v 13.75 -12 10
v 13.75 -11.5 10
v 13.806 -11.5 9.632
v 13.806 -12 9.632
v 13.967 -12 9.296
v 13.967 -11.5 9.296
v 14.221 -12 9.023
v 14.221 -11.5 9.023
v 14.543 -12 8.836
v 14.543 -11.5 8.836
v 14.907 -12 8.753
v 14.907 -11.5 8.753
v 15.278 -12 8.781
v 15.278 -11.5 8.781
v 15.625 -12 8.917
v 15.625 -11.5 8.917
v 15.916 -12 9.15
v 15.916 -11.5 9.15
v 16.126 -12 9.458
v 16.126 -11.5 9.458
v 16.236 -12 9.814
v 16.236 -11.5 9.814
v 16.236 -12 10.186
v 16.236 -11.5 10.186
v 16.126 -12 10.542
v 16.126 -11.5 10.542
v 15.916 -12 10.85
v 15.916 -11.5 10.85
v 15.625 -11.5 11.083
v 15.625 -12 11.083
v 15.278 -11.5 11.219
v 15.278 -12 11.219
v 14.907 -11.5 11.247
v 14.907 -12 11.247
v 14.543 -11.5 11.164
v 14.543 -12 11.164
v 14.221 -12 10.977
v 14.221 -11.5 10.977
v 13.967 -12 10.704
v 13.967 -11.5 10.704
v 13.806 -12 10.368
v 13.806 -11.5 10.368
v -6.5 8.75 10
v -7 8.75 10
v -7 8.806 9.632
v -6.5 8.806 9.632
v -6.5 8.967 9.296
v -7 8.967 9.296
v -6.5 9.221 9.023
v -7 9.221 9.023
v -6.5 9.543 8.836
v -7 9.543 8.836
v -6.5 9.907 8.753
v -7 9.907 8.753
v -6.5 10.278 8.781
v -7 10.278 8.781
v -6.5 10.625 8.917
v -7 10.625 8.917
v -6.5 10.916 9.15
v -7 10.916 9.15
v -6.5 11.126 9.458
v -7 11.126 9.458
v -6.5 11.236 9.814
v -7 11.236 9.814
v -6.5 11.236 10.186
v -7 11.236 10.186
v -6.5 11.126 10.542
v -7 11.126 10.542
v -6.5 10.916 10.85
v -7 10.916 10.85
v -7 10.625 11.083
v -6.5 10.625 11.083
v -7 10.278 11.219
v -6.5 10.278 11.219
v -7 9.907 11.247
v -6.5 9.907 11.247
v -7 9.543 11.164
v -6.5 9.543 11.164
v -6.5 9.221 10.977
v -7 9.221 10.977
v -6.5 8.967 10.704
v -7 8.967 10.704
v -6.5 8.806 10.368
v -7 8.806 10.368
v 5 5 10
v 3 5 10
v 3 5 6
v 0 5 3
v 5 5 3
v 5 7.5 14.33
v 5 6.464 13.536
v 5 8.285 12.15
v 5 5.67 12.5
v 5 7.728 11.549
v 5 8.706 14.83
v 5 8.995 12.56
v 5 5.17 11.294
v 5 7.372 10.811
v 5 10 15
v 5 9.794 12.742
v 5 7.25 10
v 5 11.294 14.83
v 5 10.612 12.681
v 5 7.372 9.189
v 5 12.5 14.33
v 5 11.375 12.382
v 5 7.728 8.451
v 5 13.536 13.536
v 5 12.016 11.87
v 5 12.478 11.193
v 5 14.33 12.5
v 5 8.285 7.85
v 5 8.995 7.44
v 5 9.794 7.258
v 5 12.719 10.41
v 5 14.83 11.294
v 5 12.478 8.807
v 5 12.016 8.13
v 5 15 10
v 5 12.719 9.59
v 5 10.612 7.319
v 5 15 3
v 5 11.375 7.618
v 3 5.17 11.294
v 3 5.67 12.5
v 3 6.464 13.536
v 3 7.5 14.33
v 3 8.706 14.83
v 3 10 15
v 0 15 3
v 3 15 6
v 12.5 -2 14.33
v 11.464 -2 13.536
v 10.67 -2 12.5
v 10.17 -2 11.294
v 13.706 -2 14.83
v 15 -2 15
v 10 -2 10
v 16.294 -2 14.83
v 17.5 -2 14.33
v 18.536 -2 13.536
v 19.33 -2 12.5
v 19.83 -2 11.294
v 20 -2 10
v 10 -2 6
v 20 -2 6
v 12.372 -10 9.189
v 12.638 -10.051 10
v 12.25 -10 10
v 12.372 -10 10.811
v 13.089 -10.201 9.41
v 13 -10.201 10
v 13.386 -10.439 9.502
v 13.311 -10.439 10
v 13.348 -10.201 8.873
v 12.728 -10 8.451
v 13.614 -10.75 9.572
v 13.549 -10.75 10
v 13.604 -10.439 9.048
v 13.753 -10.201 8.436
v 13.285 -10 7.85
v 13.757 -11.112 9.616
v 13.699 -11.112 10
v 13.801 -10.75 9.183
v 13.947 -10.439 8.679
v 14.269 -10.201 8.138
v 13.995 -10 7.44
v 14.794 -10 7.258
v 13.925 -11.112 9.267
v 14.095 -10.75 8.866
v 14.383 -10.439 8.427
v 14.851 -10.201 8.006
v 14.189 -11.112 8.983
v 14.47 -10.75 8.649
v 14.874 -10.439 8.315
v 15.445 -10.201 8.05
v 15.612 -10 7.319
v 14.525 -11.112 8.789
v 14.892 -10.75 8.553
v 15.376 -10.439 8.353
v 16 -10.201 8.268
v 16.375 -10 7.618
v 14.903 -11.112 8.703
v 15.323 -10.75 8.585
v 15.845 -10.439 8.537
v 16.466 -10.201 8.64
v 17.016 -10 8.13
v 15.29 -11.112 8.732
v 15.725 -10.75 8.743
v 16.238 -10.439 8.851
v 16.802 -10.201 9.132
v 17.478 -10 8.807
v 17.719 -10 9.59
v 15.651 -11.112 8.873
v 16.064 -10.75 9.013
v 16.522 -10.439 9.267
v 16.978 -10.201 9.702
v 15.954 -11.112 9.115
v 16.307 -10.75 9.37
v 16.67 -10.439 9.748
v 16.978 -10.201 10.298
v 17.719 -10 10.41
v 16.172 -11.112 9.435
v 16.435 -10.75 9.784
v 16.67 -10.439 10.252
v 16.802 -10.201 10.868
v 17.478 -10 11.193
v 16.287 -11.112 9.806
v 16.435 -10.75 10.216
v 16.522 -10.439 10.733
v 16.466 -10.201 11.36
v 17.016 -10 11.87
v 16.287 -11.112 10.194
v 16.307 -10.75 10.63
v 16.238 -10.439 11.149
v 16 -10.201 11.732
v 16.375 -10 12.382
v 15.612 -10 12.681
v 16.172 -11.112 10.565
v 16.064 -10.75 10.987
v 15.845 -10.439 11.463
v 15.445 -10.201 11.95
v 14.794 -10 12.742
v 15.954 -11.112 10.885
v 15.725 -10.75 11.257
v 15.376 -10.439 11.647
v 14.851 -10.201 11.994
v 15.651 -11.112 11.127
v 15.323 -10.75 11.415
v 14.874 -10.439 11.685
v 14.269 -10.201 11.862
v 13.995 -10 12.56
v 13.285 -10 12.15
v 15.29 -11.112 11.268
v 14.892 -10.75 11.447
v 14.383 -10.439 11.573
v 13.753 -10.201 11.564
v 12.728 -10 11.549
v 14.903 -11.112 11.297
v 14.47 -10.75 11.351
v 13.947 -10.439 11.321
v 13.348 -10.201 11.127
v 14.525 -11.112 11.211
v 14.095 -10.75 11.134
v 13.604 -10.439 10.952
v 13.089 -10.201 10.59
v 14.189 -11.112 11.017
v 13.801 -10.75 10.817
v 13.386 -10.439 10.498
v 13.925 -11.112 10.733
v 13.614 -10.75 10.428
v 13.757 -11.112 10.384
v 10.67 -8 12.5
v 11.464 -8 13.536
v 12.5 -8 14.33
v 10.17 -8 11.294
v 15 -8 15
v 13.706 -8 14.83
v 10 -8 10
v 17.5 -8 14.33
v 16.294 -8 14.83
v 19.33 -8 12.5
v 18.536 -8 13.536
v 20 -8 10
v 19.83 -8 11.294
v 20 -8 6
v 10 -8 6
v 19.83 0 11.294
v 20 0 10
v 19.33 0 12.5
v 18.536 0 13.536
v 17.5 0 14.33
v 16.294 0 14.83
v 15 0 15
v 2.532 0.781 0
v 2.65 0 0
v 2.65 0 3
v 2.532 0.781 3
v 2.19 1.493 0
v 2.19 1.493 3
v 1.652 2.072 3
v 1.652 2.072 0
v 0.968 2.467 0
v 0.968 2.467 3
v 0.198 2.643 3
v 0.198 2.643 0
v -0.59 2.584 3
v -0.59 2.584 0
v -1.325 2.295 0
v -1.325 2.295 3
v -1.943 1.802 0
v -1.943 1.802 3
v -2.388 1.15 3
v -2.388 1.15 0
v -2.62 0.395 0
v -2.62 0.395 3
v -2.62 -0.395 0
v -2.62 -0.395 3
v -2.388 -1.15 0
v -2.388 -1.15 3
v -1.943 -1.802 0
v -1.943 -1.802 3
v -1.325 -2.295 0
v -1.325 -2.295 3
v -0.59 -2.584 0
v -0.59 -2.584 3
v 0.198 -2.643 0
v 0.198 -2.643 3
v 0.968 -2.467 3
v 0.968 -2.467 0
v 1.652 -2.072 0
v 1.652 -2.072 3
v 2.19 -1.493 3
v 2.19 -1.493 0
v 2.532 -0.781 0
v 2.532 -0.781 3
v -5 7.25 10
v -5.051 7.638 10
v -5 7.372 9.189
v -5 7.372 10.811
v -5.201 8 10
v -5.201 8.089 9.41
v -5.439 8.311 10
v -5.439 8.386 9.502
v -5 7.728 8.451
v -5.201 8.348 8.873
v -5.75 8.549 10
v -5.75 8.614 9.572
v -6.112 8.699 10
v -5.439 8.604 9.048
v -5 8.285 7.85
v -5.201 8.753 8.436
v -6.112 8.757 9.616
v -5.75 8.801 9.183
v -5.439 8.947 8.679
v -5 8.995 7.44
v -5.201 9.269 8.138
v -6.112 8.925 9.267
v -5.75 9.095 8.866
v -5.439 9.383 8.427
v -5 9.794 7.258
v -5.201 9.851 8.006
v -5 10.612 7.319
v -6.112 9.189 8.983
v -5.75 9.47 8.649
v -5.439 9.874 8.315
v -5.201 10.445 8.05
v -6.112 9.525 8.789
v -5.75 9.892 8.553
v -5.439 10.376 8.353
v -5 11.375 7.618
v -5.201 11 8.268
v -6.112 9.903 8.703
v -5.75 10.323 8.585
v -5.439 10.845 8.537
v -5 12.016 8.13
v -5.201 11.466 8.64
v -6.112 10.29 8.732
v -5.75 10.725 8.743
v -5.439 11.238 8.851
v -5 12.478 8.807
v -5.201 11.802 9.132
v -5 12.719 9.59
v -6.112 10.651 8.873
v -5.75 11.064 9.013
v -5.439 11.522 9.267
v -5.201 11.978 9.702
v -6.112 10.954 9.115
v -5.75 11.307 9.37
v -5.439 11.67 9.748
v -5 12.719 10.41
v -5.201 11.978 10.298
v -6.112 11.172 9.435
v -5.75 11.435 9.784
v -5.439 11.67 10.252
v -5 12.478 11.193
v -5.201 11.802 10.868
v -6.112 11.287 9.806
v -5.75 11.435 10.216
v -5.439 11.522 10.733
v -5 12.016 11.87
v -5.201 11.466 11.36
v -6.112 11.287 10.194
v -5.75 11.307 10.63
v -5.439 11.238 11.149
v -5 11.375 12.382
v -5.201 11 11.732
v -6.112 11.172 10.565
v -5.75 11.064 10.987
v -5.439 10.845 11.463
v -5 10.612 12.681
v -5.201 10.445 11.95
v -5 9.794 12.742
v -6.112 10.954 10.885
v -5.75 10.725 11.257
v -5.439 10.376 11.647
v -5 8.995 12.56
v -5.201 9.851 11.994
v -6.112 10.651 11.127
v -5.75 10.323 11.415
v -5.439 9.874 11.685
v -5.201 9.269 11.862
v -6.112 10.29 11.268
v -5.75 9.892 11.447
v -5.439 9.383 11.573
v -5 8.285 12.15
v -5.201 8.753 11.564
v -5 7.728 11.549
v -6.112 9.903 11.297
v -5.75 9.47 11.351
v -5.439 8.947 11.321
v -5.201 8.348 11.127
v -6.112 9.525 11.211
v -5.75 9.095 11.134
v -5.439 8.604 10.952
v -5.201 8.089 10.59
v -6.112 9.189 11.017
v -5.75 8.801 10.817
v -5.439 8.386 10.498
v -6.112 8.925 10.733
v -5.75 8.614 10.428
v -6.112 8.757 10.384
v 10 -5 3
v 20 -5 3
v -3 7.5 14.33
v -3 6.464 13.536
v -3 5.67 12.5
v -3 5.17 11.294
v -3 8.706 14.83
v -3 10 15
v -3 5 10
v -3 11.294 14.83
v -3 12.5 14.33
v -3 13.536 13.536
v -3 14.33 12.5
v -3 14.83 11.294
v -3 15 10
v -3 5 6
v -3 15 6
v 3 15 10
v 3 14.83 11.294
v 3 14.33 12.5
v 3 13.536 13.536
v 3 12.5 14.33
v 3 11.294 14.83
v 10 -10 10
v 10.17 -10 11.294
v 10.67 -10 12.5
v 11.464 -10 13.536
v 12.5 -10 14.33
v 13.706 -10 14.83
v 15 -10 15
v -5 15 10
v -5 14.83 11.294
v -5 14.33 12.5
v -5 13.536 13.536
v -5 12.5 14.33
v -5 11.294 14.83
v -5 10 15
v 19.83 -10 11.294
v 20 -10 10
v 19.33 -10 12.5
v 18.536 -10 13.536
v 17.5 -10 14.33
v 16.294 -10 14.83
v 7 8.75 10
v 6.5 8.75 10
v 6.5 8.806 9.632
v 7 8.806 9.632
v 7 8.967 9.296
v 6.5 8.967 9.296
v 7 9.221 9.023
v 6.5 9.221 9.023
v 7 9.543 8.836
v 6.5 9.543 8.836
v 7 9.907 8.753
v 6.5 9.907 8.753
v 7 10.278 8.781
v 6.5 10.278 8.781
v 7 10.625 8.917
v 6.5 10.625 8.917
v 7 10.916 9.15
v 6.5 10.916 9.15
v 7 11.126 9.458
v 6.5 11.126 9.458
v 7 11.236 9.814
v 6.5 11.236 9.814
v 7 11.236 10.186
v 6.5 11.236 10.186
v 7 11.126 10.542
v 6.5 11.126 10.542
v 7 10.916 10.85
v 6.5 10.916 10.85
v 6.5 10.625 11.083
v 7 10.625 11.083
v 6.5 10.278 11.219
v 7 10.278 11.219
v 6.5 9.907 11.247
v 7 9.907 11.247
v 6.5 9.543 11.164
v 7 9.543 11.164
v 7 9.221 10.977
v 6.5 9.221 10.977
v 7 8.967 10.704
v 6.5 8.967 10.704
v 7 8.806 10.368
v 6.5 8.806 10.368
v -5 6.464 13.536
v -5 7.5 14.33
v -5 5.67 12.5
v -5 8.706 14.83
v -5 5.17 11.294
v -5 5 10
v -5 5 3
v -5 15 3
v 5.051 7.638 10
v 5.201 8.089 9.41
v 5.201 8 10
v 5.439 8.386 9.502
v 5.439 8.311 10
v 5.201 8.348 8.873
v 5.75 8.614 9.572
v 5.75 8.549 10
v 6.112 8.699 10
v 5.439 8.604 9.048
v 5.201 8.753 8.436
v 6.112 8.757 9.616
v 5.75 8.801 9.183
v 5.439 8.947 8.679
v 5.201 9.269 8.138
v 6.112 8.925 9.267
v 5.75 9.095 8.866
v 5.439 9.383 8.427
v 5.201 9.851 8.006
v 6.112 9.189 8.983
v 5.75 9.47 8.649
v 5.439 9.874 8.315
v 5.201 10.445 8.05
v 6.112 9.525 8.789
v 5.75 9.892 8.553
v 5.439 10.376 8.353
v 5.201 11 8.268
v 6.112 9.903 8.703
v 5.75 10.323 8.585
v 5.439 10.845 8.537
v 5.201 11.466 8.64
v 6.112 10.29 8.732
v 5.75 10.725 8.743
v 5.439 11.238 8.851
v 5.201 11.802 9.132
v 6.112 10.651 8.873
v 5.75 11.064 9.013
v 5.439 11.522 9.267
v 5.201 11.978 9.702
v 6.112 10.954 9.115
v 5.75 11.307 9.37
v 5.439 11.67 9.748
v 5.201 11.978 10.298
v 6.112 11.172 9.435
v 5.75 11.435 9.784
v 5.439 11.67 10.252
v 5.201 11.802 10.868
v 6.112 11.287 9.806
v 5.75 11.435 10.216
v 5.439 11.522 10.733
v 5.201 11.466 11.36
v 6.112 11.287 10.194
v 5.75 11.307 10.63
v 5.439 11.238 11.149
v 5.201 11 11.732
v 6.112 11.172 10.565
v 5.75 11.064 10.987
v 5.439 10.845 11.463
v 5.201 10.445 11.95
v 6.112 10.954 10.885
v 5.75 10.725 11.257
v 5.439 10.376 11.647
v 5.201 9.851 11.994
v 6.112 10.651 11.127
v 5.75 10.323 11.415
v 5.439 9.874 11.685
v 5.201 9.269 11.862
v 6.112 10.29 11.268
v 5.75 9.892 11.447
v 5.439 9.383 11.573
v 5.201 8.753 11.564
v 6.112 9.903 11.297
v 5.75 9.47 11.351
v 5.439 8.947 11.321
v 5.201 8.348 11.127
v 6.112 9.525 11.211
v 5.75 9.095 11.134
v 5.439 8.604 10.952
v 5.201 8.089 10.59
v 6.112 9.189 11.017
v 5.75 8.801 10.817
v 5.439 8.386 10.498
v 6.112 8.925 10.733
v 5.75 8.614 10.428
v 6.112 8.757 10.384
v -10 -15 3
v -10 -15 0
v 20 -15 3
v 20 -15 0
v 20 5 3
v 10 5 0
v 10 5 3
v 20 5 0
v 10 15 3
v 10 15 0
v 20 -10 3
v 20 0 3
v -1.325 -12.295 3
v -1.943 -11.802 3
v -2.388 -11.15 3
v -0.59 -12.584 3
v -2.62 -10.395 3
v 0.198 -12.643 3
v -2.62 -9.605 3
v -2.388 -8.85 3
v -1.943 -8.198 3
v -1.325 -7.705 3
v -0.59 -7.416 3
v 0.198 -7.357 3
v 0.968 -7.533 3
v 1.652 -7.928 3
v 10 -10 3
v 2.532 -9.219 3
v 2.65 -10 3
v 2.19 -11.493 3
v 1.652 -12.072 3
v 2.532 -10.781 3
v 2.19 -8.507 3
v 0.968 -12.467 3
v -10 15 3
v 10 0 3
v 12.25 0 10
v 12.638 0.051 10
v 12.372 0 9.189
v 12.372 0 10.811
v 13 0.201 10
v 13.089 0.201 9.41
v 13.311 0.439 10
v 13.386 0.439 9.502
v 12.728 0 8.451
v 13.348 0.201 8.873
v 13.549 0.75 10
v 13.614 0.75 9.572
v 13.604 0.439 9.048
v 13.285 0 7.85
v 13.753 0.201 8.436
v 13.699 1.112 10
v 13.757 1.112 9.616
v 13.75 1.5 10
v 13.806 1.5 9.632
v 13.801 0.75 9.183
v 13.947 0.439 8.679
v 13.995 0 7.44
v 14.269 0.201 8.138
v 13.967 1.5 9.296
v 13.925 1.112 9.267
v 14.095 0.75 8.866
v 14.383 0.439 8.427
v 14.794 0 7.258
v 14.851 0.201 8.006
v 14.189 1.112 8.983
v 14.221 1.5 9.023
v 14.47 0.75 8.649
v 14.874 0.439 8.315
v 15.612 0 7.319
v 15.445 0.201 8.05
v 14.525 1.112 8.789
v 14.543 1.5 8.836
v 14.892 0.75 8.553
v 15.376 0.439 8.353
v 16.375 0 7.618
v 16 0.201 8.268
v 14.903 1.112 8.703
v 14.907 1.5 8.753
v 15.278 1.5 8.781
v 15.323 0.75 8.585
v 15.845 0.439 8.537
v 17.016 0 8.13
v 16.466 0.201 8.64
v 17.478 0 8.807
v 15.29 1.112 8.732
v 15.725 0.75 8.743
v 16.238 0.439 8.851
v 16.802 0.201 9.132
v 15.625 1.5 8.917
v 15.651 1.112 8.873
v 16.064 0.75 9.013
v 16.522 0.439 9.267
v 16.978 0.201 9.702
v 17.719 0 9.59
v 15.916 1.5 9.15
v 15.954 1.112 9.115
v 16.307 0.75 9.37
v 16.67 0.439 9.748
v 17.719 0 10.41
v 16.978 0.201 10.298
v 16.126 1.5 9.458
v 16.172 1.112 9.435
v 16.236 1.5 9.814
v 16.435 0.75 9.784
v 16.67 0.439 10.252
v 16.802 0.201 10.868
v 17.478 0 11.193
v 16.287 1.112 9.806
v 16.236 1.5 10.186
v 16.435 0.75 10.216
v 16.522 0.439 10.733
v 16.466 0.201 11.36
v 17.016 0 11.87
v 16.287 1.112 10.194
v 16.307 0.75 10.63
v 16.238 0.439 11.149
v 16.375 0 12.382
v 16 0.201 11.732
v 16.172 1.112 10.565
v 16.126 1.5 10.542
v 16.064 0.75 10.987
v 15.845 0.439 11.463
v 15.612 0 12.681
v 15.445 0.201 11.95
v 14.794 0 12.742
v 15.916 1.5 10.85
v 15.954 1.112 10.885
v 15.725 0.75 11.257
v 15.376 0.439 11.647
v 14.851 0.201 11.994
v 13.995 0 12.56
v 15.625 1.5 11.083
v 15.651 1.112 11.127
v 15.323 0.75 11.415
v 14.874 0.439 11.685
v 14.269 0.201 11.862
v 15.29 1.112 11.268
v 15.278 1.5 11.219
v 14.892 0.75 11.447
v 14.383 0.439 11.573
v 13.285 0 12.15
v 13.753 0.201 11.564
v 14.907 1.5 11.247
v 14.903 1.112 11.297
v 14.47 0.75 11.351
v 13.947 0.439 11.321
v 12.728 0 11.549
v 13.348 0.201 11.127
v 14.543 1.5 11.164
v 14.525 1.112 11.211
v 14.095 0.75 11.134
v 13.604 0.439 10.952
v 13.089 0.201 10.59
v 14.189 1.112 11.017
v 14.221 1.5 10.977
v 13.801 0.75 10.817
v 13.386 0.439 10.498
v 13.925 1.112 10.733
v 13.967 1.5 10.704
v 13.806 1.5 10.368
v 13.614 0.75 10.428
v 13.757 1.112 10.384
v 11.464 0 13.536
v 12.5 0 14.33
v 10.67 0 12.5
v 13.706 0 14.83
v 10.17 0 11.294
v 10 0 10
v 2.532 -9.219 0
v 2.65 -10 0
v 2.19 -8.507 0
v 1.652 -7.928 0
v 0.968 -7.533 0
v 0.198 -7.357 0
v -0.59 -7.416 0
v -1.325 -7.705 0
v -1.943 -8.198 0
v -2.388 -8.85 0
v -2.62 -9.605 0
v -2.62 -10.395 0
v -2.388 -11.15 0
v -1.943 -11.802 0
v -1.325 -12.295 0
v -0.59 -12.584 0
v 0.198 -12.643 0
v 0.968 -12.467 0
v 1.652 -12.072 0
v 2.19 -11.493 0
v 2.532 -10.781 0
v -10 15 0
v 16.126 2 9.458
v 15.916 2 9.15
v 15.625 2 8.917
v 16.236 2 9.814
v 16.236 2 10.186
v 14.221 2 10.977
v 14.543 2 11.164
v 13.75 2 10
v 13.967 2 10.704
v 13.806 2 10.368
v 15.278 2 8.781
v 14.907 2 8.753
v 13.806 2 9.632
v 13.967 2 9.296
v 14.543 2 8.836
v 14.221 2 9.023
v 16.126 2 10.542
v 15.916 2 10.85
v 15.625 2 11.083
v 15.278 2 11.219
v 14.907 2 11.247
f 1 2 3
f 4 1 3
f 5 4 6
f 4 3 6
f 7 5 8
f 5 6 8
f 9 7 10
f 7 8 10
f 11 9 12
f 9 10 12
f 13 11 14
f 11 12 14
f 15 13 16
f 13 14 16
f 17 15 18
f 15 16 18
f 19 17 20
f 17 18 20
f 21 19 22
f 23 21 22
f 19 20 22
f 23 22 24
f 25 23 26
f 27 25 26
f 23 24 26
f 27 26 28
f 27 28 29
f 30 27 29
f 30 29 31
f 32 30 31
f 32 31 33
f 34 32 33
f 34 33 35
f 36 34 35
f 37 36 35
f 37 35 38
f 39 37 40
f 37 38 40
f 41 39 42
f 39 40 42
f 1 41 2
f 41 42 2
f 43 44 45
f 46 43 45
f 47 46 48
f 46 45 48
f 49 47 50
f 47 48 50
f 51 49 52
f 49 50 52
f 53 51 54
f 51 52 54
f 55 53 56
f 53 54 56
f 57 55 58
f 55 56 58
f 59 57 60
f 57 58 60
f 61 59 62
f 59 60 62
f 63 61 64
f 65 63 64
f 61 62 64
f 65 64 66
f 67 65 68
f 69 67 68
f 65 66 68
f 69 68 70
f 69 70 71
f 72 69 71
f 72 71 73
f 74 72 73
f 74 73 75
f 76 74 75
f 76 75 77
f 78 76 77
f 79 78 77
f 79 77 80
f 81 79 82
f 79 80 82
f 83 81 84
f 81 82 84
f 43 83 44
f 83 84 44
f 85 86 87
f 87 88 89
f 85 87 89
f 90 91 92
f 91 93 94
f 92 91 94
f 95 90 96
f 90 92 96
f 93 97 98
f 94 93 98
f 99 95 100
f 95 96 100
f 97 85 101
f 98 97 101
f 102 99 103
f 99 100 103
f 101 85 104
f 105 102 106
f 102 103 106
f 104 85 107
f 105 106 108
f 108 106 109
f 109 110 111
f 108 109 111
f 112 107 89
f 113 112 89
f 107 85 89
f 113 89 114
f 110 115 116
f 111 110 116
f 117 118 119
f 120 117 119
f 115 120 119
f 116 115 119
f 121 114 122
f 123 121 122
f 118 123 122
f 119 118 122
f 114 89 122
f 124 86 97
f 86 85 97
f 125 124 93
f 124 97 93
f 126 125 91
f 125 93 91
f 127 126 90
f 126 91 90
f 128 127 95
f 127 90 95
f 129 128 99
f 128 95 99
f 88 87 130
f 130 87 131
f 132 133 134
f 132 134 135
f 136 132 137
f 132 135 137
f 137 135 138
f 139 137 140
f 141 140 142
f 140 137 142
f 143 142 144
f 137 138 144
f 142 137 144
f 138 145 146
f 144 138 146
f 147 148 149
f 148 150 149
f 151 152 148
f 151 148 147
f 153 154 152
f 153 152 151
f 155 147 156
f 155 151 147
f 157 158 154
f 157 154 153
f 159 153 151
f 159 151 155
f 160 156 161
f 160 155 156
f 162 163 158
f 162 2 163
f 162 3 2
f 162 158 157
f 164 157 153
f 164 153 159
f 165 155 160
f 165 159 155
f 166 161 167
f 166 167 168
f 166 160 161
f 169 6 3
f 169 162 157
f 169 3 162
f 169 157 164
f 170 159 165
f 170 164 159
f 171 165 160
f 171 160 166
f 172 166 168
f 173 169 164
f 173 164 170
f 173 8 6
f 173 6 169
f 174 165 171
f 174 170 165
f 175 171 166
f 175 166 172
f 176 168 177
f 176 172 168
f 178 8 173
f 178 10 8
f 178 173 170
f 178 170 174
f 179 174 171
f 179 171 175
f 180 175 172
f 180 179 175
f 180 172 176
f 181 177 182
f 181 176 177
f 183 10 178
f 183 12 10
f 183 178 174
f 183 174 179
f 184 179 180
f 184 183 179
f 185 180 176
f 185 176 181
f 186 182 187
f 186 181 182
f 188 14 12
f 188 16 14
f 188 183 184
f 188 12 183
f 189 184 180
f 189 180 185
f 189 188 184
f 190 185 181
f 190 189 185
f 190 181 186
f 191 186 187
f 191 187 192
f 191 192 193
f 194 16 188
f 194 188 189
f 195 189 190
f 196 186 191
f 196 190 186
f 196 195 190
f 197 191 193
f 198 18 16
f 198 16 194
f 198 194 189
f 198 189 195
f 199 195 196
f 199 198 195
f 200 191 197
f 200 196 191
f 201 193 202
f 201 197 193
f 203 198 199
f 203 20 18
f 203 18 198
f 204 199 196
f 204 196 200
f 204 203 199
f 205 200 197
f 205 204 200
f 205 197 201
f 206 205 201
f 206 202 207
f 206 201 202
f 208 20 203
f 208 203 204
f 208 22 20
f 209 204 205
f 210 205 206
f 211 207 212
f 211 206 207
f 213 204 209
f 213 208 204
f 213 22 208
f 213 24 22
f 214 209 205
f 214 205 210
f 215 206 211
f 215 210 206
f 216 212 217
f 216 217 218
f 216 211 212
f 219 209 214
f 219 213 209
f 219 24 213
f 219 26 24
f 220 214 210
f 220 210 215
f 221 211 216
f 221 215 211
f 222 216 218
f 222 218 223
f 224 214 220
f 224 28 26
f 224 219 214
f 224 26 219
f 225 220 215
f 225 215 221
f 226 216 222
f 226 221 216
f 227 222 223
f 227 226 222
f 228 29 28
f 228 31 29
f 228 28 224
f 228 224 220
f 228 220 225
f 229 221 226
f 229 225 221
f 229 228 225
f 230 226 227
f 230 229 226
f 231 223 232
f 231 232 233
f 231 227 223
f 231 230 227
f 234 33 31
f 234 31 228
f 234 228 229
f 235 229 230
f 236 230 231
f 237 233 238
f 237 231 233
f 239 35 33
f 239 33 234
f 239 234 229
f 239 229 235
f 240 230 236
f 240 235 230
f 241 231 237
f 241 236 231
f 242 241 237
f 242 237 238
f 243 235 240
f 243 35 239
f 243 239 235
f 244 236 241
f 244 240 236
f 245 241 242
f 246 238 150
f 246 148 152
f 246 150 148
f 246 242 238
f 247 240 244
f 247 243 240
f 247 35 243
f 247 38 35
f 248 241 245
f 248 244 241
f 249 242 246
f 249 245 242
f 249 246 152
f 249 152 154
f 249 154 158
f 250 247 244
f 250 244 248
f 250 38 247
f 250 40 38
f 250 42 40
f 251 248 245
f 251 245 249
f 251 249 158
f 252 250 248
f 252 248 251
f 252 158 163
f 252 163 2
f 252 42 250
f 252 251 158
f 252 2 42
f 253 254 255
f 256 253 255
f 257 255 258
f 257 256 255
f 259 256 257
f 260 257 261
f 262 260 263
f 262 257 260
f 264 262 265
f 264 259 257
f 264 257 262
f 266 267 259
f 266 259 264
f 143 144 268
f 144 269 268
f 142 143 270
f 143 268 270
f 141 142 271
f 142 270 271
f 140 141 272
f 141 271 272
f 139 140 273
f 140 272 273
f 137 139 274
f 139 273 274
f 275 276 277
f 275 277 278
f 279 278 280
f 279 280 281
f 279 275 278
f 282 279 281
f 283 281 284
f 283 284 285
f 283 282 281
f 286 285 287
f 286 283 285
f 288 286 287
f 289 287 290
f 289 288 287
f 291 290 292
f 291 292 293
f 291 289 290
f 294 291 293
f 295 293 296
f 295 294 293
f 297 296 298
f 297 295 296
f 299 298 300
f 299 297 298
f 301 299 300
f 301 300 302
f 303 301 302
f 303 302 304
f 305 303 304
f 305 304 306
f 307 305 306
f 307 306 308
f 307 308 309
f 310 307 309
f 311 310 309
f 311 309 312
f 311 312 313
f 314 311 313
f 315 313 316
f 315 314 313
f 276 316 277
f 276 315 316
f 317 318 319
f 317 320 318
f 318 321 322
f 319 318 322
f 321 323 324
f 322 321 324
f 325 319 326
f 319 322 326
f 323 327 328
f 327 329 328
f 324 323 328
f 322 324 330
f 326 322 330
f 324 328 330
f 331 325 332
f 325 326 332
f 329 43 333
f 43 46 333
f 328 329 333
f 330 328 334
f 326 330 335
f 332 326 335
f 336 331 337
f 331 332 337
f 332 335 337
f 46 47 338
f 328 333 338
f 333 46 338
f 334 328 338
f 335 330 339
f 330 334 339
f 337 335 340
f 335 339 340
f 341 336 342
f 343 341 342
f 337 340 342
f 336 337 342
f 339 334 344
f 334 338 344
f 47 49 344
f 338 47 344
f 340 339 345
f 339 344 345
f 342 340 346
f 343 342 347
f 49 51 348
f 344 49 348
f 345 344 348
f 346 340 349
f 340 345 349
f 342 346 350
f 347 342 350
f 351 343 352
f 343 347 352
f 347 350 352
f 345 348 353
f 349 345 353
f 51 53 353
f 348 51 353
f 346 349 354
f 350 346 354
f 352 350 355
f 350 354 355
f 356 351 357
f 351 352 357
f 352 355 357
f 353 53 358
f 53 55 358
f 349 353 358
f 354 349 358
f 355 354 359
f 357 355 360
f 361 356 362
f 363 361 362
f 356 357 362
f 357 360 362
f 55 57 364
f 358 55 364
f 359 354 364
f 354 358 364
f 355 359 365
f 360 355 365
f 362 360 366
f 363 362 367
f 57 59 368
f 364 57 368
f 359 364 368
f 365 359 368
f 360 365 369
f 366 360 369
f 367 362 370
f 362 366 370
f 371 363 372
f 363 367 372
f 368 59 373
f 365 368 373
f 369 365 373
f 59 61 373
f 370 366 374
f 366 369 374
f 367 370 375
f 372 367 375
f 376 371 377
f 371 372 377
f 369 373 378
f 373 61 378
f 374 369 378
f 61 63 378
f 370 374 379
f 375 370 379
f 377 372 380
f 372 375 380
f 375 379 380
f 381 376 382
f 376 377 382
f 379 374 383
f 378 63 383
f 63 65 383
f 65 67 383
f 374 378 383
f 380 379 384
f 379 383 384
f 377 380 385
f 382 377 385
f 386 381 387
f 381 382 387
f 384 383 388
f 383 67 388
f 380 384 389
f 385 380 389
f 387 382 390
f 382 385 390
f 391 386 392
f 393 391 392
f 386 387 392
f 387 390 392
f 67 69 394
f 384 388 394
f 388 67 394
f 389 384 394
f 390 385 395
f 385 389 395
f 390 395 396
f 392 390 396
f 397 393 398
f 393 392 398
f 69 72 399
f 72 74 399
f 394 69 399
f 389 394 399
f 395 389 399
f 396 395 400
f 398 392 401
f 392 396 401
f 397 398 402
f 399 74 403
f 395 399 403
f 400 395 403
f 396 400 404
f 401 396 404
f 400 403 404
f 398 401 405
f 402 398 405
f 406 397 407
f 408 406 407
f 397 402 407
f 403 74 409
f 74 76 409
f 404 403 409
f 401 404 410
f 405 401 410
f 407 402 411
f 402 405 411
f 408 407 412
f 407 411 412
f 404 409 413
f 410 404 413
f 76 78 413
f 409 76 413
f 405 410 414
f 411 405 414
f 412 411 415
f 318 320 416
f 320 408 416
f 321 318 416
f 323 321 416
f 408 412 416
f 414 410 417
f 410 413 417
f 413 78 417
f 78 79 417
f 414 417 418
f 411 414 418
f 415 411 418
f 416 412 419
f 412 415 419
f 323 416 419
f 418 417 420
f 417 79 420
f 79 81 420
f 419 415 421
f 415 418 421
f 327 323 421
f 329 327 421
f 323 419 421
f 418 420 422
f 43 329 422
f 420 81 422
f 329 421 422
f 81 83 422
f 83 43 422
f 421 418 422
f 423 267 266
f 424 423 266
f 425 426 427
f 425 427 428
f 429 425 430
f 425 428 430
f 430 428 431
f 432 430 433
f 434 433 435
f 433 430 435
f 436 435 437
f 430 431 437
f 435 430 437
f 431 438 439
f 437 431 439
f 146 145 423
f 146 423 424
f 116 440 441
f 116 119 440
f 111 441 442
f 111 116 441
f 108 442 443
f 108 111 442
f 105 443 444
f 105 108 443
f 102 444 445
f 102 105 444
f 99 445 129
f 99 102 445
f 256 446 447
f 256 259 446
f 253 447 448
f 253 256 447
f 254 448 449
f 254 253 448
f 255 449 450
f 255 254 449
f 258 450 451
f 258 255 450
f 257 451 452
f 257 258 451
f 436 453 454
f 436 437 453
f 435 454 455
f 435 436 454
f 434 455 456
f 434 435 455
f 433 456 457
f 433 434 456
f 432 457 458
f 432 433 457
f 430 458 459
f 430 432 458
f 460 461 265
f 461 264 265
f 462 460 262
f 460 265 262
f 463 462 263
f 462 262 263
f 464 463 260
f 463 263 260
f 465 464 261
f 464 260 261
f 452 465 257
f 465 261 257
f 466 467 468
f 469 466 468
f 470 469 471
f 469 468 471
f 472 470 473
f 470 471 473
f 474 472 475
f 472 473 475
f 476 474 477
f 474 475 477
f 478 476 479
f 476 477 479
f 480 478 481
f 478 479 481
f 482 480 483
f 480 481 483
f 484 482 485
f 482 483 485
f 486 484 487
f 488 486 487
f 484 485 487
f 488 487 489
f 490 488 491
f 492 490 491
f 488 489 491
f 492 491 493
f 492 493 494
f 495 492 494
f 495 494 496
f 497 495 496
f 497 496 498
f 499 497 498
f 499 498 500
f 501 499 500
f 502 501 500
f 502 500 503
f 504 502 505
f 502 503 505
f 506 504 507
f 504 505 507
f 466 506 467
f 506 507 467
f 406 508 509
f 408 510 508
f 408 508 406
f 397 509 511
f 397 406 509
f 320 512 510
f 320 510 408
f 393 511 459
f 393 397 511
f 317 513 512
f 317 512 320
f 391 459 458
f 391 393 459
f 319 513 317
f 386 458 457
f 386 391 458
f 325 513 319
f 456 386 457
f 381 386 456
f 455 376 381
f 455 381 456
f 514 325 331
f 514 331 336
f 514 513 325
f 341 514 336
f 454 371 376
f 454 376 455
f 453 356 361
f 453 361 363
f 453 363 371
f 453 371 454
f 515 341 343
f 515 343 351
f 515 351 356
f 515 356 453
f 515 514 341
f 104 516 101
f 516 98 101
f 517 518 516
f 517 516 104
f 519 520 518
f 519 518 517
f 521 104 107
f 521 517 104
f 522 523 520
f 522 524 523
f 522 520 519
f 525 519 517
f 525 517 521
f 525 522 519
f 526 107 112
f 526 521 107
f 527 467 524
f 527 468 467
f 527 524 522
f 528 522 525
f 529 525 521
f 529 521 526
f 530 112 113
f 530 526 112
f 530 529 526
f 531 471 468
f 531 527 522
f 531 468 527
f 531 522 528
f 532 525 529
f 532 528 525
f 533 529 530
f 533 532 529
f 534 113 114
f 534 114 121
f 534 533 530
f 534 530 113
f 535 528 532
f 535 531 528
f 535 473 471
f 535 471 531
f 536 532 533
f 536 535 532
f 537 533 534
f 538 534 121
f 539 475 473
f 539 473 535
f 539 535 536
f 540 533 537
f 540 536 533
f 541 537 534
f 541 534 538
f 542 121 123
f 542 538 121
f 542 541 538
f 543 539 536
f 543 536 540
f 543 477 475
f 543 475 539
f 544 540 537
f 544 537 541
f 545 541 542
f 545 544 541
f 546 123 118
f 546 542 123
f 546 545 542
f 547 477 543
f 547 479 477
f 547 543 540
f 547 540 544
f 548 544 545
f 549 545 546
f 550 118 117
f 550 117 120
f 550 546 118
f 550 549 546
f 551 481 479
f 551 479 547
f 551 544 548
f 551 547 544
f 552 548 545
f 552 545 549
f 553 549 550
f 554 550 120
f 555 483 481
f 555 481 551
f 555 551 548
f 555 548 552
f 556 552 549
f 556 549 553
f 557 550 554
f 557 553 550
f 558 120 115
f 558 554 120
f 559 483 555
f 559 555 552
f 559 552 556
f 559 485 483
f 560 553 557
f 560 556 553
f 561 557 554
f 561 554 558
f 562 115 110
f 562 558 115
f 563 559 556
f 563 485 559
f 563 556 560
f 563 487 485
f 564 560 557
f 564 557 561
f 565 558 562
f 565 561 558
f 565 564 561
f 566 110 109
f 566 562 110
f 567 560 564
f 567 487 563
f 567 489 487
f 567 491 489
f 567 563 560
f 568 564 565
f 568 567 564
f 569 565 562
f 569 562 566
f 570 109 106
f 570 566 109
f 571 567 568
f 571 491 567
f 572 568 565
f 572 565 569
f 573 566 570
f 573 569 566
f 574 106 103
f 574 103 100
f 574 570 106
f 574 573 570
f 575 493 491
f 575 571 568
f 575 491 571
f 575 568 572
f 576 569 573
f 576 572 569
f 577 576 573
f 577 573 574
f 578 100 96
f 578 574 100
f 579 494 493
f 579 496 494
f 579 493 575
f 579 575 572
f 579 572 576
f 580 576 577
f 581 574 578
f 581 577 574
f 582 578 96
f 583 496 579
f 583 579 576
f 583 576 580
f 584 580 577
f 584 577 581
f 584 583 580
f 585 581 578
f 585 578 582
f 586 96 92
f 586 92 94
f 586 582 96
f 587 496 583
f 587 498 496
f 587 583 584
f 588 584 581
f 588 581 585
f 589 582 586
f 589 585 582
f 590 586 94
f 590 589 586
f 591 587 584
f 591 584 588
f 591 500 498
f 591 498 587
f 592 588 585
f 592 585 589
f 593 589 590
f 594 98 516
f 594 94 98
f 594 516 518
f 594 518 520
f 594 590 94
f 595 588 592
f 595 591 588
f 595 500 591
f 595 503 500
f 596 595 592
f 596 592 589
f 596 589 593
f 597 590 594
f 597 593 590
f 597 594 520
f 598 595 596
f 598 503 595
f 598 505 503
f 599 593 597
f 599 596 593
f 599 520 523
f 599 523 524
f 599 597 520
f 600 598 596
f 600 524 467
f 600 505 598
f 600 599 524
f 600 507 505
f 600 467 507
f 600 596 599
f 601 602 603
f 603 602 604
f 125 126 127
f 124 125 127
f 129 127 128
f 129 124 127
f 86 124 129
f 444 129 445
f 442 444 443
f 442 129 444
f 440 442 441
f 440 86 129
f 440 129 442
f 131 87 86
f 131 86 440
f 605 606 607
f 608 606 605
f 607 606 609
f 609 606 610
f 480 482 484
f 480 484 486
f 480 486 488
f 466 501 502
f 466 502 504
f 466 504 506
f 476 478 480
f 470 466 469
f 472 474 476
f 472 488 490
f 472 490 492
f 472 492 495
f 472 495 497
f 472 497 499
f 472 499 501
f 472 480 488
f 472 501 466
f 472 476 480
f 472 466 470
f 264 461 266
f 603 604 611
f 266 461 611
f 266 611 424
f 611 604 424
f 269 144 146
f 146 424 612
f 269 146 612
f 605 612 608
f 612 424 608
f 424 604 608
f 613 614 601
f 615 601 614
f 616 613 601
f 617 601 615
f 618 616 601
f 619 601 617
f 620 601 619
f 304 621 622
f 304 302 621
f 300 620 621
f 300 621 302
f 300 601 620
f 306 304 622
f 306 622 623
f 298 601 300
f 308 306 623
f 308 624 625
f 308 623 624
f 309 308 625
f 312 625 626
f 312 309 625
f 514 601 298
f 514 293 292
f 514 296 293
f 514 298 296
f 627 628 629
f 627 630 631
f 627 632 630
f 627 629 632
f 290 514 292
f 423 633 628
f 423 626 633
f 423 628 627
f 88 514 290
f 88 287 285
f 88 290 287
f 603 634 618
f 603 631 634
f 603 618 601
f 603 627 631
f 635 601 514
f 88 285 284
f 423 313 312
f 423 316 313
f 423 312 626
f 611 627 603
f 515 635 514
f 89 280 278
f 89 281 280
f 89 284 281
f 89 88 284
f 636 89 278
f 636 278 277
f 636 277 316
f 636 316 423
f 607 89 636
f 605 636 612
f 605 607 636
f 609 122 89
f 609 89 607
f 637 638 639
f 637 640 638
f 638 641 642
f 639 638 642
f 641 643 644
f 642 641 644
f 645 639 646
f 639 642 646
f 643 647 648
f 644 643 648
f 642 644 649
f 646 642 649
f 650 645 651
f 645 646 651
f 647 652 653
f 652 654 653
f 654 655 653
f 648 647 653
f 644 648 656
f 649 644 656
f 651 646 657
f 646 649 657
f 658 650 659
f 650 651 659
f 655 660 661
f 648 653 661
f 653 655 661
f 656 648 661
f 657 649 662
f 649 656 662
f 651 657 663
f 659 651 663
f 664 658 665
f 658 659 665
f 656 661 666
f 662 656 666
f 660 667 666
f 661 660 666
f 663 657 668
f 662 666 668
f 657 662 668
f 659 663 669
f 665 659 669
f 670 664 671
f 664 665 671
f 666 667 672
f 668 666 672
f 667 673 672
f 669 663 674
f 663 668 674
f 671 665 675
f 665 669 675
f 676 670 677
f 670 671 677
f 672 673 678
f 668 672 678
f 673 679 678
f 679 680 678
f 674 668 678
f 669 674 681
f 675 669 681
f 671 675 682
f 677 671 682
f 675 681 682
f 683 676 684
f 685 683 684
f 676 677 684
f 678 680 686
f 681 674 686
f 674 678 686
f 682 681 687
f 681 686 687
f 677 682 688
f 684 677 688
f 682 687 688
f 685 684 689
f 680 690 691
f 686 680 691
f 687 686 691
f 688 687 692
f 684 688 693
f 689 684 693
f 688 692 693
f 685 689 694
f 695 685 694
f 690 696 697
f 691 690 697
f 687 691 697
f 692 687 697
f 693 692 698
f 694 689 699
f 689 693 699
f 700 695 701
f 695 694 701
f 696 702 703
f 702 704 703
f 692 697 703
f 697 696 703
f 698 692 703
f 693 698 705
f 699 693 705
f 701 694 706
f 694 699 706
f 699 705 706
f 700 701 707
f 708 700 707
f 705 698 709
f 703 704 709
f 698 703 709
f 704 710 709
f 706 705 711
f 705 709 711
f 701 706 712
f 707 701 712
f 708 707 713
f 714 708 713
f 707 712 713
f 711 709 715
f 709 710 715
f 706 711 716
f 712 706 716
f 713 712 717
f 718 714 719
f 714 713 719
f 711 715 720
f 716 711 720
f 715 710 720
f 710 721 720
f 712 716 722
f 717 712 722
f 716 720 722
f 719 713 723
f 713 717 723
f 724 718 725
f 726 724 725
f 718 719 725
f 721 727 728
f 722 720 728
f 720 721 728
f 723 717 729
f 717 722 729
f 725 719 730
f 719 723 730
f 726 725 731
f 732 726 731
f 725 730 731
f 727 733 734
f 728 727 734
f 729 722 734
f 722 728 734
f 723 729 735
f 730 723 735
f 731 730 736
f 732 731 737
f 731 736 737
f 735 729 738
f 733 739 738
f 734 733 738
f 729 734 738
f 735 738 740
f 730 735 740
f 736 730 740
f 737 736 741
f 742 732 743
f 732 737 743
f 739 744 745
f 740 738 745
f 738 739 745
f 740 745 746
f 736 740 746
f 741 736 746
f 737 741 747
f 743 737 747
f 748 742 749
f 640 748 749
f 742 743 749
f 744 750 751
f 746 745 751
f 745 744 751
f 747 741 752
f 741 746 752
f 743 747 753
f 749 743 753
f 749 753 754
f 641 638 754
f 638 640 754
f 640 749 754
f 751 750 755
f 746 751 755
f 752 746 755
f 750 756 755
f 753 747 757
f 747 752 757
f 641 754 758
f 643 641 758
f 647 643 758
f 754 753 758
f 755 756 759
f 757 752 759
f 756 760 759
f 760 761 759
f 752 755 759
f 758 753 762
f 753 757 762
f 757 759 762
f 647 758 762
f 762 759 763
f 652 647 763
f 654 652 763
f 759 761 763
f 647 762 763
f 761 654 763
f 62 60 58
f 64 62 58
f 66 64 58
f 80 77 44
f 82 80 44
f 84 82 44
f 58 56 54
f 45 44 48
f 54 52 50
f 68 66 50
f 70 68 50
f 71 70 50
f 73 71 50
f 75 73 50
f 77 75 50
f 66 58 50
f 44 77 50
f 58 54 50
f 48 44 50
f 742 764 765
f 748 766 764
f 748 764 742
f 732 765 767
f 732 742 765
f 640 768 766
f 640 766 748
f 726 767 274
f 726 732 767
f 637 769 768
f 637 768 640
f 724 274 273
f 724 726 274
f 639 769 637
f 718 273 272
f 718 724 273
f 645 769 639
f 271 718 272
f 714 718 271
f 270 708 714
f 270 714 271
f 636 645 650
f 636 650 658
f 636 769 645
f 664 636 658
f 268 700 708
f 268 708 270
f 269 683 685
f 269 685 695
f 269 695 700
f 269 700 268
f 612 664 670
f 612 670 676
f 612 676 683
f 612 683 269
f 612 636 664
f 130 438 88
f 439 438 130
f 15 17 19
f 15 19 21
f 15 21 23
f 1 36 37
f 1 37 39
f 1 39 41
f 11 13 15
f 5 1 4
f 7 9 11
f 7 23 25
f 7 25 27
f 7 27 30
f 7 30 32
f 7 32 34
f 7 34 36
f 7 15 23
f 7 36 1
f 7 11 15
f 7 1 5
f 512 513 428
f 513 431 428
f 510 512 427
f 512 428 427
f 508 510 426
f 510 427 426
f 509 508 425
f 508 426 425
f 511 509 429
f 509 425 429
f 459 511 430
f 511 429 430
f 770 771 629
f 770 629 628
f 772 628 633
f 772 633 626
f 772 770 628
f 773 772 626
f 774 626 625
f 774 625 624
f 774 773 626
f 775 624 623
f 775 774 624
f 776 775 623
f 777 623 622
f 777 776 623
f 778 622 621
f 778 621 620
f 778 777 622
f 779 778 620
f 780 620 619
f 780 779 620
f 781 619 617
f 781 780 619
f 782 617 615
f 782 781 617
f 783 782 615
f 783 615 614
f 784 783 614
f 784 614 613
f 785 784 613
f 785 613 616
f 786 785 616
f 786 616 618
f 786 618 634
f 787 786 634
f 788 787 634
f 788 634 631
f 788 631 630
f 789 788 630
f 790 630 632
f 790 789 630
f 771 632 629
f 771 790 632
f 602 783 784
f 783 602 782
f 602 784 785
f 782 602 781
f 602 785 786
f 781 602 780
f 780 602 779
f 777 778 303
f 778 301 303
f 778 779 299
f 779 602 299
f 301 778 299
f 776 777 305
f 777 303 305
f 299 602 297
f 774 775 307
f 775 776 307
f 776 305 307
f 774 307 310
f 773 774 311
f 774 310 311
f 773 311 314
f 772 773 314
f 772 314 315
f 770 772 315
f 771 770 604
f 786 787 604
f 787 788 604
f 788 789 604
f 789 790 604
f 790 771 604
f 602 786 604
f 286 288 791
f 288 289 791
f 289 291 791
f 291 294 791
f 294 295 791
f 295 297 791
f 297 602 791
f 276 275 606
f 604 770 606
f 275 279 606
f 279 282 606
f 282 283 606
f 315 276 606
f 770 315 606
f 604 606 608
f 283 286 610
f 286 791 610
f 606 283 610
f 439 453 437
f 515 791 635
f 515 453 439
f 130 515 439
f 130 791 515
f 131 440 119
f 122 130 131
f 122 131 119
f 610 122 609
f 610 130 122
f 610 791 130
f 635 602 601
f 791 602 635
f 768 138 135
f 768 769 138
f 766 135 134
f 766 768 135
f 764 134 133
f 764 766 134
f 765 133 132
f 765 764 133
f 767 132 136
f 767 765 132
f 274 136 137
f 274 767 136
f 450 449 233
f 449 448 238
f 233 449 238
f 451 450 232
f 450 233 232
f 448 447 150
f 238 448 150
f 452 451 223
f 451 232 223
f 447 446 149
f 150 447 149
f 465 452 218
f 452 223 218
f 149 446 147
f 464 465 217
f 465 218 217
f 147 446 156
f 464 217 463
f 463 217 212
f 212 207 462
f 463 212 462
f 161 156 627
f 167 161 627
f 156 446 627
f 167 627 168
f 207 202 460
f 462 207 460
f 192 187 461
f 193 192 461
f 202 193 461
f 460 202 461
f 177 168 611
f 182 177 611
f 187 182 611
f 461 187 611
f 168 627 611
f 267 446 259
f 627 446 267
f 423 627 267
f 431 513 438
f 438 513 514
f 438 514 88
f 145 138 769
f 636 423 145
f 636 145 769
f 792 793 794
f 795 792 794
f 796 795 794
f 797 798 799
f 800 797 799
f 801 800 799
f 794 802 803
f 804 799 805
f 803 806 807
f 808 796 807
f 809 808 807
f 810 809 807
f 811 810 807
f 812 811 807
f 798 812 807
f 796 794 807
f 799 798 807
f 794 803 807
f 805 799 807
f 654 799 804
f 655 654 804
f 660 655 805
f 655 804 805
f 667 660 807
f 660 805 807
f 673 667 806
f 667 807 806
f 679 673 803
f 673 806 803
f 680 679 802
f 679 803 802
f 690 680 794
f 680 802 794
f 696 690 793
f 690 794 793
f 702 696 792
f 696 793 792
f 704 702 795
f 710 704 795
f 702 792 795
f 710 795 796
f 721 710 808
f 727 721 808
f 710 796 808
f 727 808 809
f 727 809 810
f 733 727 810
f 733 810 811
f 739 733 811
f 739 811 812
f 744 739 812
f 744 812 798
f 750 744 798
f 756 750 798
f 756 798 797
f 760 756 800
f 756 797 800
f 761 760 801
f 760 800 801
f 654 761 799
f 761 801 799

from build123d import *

# Parameters (mm, degrees)
SKETCH1_W           = 20
SKETCH1_H           = 30
SKETCH1_R           = 2.65
SKETCH1_W_2         = 10
SKETCH1_H_2         = 20
BOSS_EXTRUDE1_DEPTH = 3
SKETCH2_W           = 10
SKETCH2_H           = 2
SKETCH2_W_2         = 2
SKETCH2_H_2         = 10
BOSS_EXTRUDE2_DEPTH = 12
FILLET1_R           = 5
SKETCH3_R           = 1.25
BOSS_EXTRUDE3_DEPTH = 2
BOSS_EXTRUDE4_START = -12
SKETCH3_2_R         = 1.25
BOSS_EXTRUDE4_DEPTH = 2
SKETCH4_R           = 1.25
BOSS_EXTRUDE5_DEPTH = 2
BOSS_EXTRUDE6_START = -12
SKETCH4_3_R         = 1.25
BOSS_EXTRUDE6_DEPTH = 2
FILLET2_R           = 1.5
CHAMFER1_SIZE       = 3


with BuildPart() as part:
    # Sketch1 → Boss-Extrude1 (new body)
    # profile 1 of 2: a face of its own
    with BuildSketch(Plane.XY):
        Rectangle(SKETCH1_W, SKETCH1_H)
        Circle(SKETCH1_R, mode=Mode.SUBTRACT)
        with Locations((0, -10)):
            Circle(SKETCH1_R, mode=Mode.SUBTRACT)
    # profile 2 of 2: a face of its own
    with BuildSketch(Plane.XY):
        with Locations((15, -5)):
            Rectangle(SKETCH1_W_2, SKETCH1_H_2)
    extrude(amount=BOSS_EXTRUDE1_DEPTH)

    # Sketch2 → Boss-Extrude2 (add)
    with BuildSketch(Plane.XY.offset(3)):
        with Locations((15, -9)):
            Rectangle(SKETCH2_W, SKETCH2_H)
        with Locations((15, -1)):
            Rectangle(SKETCH2_W, SKETCH2_H)
        with Locations((4, 10)):
            Rectangle(SKETCH2_W_2, SKETCH2_H_2)
        with Locations((-4, 10)):
            Rectangle(SKETCH2_W_2, SKETCH2_H_2)
    extrude(amount=BOSS_EXTRUDE2_DEPTH)

    # Fillet1
    fillet1_edges = [part.edges().sort_by_distance(p)[0] for p in [
        (-4, 15, 15),
        (-4, 5, 15),
        (4, 15, 15),
        (4, 5, 15),
        (10, -1, 15),
        (20, -1, 15),
        (20, -9, 15),
        (10, -9, 15),
    ]]
    fillet(fillet1_edges, radius=FILLET1_R - 0.0001)  # a hair under: the kernel refuses the full size

    # Sketch3 → Boss-Extrude3 (add)
    with BuildSketch(Plane.XZ.offset(10)):
        with Locations(Location((15, 10, 0), (0, 0, 180))):
            Circle(SKETCH3_R)
    extrude(amount=BOSS_EXTRUDE3_DEPTH)

    # Sketch3<2> → Boss-Extrude4 (add)
    with BuildSketch(Plane.XZ.offset(10).offset(BOSS_EXTRUDE4_START)):
        with Locations(Location((15, 10, 0), (0, 0, 180))):
            Circle(SKETCH3_2_R)
    extrude(amount=BOSS_EXTRUDE4_DEPTH)

    # Sketch4 → Boss-Extrude5 (add)
    with BuildSketch(Plane(origin=(5, 0, 0), x_dir=(0, 0, -1), z_dir=(1, 0, 0))):
        with Locations(Location((-10, 10, 0), (0, 0, 270))):
            Circle(SKETCH4_R)
    extrude(amount=BOSS_EXTRUDE5_DEPTH)

    # Sketch4<3> → Boss-Extrude6 (add)
    with BuildSketch(Plane(origin=(5, 0, 0), x_dir=(0, 0, -1), z_dir=(1, 0, 0)).offset(BOSS_EXTRUDE6_START)):
        with Locations(Location((-10, 10, 0), (0, 0, 270))):
            Circle(SKETCH4_3_R)
    extrude(amount=BOSS_EXTRUDE6_DEPTH)

    # Fillet2
    fillet2_edges = [part.edges().sort_by_distance(p)[0] for p in [
        (16.25, -10, 10),
        (16.25, 0, 10),
        (5, 11.25, 10),
        (-5, 11.25, 10),
    ]]
    fillet(fillet2_edges, radius=FILLET2_R)

    # Chamfer1
    chamfer1_edges = [part.edges().sort_by_distance(p)[0] for p in [
        (15, -8, 3),
        (15, -2, 3),
        (-3, 10, 3),
        (3, 10, 3),
    ]]
    chamfer(chamfer1_edges, length=CHAMFER1_SIZE - 0.0001)  # a hair under: the kernel refuses the full size


solid = part.part
